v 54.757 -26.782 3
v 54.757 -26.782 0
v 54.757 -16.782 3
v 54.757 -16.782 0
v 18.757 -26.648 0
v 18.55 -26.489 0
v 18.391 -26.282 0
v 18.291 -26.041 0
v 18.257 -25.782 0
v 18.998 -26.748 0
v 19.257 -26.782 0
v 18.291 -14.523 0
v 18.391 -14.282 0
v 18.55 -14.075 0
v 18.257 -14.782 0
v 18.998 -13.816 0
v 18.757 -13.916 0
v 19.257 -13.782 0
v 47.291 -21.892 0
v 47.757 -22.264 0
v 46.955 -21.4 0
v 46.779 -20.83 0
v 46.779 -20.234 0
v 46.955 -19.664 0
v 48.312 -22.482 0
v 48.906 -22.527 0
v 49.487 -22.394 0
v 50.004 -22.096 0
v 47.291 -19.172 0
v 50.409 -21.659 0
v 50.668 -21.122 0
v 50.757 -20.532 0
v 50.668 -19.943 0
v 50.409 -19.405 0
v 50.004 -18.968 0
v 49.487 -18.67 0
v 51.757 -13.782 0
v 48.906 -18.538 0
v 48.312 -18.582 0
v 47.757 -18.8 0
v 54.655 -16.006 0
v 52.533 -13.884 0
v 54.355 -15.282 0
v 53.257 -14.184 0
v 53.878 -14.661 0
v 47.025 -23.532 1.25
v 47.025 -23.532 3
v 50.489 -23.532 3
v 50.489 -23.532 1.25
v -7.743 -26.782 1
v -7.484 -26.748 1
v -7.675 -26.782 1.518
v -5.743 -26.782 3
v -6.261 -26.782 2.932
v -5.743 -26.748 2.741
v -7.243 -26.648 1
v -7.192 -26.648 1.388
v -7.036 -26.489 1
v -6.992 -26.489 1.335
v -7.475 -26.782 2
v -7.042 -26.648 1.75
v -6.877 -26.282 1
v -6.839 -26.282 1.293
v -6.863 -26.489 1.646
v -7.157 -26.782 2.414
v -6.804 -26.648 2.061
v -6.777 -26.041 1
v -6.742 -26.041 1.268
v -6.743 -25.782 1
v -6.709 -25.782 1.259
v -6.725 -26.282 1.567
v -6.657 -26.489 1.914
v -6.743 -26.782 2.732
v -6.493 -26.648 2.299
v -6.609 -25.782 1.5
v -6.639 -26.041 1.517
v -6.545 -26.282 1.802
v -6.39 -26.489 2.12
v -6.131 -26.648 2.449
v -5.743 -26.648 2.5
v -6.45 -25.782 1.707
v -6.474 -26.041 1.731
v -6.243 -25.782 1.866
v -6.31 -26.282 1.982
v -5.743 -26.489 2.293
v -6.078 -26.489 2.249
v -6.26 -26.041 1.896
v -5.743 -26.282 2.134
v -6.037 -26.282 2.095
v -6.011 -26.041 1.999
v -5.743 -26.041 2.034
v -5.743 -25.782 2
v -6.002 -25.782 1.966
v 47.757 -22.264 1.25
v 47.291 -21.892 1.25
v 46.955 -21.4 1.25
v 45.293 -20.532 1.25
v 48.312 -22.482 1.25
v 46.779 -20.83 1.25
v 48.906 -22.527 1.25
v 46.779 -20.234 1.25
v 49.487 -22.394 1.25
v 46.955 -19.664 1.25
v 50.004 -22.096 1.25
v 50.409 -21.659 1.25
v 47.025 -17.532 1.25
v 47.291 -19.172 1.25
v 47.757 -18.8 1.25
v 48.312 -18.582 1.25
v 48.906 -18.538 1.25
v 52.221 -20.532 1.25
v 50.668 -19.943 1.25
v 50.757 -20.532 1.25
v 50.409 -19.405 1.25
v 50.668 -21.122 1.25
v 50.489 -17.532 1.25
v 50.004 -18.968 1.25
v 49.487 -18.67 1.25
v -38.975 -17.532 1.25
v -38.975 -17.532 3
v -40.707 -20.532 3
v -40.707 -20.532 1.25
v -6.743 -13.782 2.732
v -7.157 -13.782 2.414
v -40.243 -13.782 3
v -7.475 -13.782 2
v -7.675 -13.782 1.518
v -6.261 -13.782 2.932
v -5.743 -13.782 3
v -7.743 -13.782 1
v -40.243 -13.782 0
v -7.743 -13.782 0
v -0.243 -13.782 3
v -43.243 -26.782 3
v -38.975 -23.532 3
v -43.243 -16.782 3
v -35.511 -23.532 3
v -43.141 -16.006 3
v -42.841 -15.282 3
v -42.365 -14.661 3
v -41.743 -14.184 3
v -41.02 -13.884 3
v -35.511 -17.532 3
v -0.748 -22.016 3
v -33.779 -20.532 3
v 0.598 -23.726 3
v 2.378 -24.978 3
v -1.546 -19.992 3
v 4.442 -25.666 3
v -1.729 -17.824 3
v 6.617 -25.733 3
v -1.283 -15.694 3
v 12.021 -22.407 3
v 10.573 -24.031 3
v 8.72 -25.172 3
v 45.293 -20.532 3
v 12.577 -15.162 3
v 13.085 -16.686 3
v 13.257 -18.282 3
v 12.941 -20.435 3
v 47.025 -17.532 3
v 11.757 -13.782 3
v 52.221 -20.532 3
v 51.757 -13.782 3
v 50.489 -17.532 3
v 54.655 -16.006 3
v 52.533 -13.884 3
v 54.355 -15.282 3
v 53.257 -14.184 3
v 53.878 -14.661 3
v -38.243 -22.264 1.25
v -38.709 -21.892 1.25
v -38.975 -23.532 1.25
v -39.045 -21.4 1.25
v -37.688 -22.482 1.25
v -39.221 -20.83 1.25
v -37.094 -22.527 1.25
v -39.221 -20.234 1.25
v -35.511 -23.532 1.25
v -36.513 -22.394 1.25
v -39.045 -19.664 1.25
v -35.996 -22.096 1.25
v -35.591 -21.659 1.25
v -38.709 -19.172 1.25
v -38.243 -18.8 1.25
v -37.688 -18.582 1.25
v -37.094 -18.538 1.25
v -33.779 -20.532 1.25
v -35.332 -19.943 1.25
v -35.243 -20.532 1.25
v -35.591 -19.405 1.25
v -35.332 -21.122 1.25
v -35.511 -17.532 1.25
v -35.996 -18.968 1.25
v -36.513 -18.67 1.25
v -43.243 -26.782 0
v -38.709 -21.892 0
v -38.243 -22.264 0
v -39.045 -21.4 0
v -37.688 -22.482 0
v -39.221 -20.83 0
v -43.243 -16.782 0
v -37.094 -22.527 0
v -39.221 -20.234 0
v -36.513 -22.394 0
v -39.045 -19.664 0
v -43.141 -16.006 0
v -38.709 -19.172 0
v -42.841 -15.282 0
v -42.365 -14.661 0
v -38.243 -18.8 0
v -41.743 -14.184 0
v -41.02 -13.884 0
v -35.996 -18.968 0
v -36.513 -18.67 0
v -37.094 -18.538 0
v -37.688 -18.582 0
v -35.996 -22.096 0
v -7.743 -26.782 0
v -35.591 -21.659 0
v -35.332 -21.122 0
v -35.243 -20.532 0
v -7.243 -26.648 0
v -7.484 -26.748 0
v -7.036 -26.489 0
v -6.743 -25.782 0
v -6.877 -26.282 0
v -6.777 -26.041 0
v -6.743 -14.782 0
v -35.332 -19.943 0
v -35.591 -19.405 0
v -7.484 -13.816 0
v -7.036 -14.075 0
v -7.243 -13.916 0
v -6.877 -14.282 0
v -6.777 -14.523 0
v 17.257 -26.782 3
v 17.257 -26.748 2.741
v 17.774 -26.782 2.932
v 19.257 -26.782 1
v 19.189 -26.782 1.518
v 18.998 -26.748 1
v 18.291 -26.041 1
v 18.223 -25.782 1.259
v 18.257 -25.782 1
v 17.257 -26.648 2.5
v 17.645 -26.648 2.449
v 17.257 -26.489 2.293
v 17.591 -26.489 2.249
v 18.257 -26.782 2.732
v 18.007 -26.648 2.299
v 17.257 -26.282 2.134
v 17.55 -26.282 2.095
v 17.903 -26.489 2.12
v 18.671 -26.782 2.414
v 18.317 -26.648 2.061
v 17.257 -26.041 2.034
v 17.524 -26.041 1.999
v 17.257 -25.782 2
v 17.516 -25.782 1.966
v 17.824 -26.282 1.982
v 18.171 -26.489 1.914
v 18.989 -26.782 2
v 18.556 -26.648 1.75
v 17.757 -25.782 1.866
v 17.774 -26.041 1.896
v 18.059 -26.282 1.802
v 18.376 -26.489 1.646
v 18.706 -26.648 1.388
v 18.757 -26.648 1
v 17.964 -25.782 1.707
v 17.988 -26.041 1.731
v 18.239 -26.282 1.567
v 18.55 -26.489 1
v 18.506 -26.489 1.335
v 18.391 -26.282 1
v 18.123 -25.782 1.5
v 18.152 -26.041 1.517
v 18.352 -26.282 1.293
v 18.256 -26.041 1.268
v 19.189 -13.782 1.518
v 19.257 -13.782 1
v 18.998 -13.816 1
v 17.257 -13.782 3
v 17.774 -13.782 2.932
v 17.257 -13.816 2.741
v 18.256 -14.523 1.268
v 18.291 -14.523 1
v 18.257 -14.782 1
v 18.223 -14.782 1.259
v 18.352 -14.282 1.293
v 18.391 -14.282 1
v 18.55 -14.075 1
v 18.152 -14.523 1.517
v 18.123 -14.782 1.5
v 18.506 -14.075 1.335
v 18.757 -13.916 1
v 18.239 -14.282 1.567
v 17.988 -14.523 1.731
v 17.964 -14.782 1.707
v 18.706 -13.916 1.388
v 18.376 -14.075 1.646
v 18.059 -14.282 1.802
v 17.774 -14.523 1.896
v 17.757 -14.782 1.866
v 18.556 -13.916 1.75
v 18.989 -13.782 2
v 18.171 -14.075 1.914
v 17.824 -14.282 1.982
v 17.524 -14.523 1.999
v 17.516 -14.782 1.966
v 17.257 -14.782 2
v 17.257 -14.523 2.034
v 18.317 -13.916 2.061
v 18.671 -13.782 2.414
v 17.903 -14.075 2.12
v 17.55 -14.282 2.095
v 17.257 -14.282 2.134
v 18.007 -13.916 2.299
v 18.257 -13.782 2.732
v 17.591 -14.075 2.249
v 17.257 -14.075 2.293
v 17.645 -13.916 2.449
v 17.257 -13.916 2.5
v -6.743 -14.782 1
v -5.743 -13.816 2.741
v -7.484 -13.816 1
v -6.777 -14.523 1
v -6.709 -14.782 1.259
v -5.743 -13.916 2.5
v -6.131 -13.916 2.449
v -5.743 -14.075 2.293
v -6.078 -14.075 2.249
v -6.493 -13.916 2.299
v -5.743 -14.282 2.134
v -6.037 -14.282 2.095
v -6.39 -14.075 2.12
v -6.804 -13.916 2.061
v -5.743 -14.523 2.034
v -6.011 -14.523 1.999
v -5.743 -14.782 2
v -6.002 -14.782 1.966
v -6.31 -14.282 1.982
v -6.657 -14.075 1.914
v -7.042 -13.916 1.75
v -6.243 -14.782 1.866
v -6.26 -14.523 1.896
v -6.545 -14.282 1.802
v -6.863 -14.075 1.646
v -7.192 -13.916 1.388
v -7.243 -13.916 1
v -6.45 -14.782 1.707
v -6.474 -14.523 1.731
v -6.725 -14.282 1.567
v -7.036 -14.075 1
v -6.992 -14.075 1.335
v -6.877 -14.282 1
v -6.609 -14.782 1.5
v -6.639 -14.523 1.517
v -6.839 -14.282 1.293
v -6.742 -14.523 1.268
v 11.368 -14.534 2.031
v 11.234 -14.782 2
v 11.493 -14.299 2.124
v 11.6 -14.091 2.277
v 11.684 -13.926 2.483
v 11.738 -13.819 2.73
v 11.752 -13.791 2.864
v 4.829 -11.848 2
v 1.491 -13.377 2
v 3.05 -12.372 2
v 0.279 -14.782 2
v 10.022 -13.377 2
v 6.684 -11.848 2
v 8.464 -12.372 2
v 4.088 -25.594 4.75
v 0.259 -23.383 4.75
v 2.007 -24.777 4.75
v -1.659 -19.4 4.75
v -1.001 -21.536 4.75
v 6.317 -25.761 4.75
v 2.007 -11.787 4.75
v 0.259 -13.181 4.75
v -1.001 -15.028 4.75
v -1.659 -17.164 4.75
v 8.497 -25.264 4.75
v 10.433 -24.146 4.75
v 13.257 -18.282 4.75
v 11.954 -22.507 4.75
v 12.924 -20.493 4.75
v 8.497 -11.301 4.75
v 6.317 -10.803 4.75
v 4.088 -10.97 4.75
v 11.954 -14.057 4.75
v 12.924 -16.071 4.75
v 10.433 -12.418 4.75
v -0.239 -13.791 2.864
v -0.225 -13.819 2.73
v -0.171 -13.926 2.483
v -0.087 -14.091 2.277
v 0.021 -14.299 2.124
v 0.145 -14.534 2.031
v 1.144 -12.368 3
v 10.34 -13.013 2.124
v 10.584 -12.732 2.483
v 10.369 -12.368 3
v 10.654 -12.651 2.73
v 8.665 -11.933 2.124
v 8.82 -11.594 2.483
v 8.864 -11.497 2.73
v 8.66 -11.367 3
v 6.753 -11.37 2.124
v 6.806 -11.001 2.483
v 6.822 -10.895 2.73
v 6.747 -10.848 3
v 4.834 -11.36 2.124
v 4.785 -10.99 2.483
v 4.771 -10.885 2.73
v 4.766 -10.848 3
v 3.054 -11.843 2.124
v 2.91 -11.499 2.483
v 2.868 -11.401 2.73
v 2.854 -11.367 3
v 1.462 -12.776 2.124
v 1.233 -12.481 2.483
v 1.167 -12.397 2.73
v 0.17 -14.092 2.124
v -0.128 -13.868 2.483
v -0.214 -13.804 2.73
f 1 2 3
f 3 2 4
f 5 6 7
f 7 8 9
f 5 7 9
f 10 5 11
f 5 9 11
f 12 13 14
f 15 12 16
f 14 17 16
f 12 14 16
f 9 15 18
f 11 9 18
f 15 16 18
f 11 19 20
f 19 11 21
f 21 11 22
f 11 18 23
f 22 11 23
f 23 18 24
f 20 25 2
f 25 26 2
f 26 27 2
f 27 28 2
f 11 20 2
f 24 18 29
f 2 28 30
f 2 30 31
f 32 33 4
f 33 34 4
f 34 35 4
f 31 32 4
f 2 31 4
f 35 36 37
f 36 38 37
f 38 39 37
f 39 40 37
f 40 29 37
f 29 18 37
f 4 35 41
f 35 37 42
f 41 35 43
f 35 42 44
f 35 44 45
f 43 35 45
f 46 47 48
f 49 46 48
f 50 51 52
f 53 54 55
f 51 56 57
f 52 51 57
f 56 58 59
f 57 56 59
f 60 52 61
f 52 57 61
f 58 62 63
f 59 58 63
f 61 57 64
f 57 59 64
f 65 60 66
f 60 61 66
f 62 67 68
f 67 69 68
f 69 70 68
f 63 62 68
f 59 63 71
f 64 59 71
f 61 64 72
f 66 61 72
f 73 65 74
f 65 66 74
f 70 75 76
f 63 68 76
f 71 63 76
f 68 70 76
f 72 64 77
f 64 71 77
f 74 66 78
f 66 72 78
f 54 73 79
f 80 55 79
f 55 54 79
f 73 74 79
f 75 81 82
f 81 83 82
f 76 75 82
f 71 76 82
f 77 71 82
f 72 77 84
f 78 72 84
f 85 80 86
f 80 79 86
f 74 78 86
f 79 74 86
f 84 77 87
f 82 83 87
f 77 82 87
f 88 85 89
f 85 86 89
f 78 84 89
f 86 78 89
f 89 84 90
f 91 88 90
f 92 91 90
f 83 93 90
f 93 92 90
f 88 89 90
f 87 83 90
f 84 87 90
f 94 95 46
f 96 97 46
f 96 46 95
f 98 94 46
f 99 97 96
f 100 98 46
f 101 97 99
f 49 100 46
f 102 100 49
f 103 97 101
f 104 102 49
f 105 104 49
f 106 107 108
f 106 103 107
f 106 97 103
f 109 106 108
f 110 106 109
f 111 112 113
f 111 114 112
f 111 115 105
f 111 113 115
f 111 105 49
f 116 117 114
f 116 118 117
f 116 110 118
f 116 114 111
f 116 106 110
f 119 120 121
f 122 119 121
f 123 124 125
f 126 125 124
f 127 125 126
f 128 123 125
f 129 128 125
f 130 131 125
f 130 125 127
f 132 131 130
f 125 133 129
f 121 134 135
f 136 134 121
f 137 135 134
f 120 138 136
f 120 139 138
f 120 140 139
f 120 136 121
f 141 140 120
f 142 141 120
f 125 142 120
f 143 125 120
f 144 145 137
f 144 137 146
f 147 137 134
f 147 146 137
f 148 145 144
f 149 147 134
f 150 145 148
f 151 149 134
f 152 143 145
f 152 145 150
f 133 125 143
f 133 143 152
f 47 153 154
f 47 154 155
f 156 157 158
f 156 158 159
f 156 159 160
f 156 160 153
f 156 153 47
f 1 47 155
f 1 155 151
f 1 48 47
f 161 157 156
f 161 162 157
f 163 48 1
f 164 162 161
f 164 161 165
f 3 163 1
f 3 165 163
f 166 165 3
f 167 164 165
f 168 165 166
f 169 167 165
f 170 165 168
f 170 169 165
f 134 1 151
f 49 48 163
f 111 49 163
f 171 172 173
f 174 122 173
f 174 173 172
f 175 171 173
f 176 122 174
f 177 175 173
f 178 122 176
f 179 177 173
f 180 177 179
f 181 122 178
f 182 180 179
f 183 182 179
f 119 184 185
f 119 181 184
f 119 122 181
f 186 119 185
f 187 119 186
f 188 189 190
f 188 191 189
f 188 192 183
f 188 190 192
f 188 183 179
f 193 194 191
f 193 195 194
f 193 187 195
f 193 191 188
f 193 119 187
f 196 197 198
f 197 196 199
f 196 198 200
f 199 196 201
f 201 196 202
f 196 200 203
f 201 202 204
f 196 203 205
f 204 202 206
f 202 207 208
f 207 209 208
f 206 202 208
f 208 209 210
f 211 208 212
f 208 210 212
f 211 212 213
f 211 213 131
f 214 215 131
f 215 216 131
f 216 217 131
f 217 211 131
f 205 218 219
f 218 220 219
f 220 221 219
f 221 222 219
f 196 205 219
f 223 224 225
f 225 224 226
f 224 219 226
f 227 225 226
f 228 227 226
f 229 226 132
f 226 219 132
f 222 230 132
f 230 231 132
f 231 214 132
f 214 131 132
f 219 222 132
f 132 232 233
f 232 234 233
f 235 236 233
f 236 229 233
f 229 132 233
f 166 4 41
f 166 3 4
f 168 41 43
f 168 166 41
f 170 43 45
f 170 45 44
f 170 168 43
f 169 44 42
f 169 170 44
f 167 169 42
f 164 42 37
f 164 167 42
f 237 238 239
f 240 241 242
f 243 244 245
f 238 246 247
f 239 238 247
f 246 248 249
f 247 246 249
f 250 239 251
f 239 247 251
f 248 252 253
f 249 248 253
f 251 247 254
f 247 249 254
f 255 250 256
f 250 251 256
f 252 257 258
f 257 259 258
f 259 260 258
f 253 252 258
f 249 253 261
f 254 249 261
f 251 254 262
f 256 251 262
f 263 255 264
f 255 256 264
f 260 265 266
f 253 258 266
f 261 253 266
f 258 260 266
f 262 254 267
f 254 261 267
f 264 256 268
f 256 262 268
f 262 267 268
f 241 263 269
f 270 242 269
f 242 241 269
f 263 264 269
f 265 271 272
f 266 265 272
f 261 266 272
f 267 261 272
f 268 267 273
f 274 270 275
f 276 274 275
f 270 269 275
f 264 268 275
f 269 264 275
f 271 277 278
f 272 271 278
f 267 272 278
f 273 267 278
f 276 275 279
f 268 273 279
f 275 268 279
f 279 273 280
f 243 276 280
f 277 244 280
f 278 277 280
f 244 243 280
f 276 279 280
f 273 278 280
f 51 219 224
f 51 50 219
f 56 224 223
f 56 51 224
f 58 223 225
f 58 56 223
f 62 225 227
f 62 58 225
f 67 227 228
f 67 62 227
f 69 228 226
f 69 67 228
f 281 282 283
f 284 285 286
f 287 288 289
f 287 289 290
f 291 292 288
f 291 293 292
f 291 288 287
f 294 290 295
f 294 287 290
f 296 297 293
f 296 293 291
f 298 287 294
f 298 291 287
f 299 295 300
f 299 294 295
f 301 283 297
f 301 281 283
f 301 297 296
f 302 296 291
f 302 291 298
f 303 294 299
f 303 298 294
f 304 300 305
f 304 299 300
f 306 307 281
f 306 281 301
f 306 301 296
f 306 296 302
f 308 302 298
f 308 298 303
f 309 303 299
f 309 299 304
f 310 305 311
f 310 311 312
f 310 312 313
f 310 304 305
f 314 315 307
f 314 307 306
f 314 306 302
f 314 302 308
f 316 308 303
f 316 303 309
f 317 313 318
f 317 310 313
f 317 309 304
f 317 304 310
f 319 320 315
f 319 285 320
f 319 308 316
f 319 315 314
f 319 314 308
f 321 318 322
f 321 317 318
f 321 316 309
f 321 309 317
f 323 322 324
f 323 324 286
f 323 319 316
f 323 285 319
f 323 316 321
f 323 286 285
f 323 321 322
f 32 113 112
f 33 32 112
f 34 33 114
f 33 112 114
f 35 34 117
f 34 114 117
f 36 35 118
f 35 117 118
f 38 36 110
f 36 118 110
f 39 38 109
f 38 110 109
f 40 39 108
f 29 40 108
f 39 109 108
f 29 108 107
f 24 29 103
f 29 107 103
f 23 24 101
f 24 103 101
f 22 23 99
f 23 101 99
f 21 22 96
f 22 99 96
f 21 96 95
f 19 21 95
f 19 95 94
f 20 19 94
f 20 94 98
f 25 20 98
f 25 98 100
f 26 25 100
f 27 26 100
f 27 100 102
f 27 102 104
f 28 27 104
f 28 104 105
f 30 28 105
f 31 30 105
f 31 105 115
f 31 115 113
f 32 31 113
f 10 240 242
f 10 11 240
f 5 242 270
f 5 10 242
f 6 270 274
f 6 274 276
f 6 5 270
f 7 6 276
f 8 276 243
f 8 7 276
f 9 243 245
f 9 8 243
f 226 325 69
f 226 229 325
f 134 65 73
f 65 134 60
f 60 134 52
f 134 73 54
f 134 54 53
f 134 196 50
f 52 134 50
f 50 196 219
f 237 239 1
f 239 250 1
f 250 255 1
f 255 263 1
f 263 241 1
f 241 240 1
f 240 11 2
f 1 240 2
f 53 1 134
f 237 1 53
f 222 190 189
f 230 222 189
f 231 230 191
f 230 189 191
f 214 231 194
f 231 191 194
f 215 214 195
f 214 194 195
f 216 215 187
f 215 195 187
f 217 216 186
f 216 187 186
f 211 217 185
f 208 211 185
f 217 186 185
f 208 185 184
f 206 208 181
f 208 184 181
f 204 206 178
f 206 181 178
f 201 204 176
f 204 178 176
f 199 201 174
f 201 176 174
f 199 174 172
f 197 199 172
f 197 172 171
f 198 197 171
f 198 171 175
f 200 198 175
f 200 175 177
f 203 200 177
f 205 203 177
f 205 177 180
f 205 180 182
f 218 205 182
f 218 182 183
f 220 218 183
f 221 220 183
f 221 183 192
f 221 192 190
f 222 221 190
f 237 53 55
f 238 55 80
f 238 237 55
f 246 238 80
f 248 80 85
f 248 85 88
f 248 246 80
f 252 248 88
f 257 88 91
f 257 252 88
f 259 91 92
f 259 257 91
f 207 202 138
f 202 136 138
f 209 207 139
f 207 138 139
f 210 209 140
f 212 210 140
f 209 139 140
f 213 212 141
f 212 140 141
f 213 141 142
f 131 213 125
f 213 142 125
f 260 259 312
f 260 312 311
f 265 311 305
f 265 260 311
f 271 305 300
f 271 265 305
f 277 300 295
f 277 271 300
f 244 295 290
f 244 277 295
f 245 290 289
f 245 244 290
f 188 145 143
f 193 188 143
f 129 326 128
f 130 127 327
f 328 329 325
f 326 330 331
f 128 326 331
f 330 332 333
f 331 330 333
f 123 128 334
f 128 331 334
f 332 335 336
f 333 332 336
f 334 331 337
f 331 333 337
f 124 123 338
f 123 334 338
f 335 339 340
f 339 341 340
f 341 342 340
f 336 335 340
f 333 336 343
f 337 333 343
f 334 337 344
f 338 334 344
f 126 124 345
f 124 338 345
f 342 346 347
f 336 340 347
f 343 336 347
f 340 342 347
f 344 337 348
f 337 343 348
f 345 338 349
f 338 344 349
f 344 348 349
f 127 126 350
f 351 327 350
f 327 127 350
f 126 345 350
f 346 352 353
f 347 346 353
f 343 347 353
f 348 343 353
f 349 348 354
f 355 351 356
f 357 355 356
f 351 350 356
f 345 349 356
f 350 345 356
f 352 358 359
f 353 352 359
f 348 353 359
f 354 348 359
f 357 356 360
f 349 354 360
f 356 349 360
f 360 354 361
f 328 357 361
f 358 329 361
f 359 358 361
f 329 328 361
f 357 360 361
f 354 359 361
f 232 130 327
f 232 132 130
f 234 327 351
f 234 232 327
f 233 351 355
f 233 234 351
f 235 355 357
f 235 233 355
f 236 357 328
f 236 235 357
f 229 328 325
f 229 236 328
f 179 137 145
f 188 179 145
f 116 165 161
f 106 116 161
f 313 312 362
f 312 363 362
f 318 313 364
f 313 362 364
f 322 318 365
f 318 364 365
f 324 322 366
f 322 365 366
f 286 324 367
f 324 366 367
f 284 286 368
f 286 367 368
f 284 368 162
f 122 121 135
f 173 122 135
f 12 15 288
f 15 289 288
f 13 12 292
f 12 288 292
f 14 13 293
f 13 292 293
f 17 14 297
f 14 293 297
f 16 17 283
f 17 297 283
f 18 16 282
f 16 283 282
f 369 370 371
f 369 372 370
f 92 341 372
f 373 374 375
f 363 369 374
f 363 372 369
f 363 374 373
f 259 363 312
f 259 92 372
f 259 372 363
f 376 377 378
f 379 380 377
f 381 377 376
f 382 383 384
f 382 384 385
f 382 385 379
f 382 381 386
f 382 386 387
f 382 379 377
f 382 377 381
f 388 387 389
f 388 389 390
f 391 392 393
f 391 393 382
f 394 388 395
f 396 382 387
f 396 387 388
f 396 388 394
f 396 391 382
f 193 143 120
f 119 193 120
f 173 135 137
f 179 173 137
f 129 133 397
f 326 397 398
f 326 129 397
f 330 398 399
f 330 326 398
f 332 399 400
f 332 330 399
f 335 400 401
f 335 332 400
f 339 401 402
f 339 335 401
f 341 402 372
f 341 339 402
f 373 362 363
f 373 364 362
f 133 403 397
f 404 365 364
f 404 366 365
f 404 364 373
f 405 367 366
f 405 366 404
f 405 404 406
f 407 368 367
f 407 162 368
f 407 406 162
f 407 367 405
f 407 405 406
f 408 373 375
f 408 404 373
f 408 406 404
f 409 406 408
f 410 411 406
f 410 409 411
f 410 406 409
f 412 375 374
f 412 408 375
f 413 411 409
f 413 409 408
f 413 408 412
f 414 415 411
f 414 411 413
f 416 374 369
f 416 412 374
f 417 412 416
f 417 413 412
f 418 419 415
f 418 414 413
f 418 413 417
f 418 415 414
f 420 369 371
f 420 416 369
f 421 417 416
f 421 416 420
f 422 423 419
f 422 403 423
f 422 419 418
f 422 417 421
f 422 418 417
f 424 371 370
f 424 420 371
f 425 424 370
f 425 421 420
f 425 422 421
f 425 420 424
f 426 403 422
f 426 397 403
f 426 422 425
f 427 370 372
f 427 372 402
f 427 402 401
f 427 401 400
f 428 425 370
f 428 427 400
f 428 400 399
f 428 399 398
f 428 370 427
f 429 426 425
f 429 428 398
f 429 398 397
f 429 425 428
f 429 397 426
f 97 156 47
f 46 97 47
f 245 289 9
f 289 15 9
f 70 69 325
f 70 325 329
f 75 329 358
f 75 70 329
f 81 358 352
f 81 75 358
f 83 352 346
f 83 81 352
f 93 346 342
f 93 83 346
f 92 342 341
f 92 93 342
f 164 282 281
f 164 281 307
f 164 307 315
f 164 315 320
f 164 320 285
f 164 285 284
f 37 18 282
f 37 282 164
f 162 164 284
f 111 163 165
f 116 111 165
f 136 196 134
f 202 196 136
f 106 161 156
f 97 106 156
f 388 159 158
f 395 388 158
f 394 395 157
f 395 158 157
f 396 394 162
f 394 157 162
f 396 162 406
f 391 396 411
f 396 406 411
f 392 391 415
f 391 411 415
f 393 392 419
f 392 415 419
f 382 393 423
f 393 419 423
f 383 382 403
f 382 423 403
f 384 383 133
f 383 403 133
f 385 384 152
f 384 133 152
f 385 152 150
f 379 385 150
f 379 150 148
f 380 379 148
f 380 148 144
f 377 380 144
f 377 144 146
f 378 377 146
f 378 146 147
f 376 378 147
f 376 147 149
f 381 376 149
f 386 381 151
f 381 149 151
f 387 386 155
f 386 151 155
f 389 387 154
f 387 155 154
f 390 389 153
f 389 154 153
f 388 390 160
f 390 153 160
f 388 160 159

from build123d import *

# Parameters (mm, degrees)
F0_W      = 98
F0_H      = 13
F1_DEPTH  = 3
F2_R      = 3
F3_R      = 2
F4_DEPTH  = 20
F5_R      = 7.5
F6_DEPTH  = 4.75
F8_DEPTH  = 1.75
F9_W      = 25
F9_H      = 16
F10_DEPTH = 2
F11_F1_R  = 1
F11_F2_R  = 0.9999


# Not quite as in the source:
# - a fillet or chamfer is up to 0.001 mm smaller than in the source, because OpenCascade refuses the exact size


with BuildPart() as f1:
    # F0 (on Top) → F1 (new body)
    with BuildSketch(Plane.XY):
        with Locations((5.7567551136, -20.2820947109)):
            Rectangle(F0_W, F0_H)
    extrude(amount=F1_DEPTH)

    # F2
    f2_edges = [f1.edges().sort_by_distance(p)[0] for p in [
        (-43.243245, -13.782095, 1.5),
        (54.756755, -13.782095, 1.5),
    ]]
    fillet(f2_edges, radius=F2_R)

    # F3 (on face) → F4 (cut)
    with BuildSketch(Plane.XY.offset(3)):
        with Locations((48.7567551136, -20.5320947109)):
            Circle(F3_R)
        with Locations((-37.2432448864, -20.5320947109)):
            Circle(F3_R)
    extrude(amount=-F4_DEPTH, mode=Mode.SUBTRACT)

    # F5 (on Top) → F6 (join)
    with BuildSketch(Plane.XY):
        with Locations((5.7567551136, -18.2820947109)):
            Circle(F5_R)
    extrude(amount=F6_DEPTH)

    # F7 (on face) → F8 (cut)
    with BuildSketch(Plane.XY.offset(3)):
        Polygon((-33.7791432713, -20.5320947109), (-35.5111940788, -17.5320947109), (-38.975295694, -17.5320947109), (-40.7073465015, -20.5320947109), (-38.975295694, -23.5320947109), (-35.5111940788, -23.5320947109), align=None)
        Polygon((50.4888059212, -17.5320947109), (47.024704306, -17.5320947109), (45.2926534985, -20.5320947109), (47.024704306, -23.5320947109), (50.4888059212, -23.5320947109), (52.2208567287, -20.5320947109), align=None)
    extrude(amount=-F8_DEPTH, mode=Mode.SUBTRACT)

    # F9 (on face) → F10 (cut)
    with BuildSketch(Plane(origin=(0, 0, 0), x_dir=(1, 0, 0), z_dir=(0, 0, -1))):
        with Locations((5.7567551136, 18.7820947109)):
            Rectangle(F9_W, F9_H)
    extrude(amount=-F10_DEPTH, mode=Mode.SUBTRACT)

    # F11: fillet of radius 1 on 6 edges, made by hand

    # F11_f1
    f11_f1_edges = [f1.edges().sort_by_distance(p)[0] for p in [
        (18.2567551136, -20.2820947109, 2),
        (-6.7432448864, -20.2820947109, 2),
    ]]
    fillet(f11_f1_edges, radius=F11_F1_R)

    # F11_f2 (radius 1 in the source; OpenCascade refuses exactly that, so slightly less here)
    f11_f2_edges = [f1.edges().sort_by_distance(p)[0] for p in [
        (14.5067551136, -13.7820947109, 2),
        (5.7567551136, -10.7820947109, 2),
        (-2.9932448864, -13.7820947109, 2),
        (5.7567551136, -26.7820947109, 2),
        (17.9638618948, -26.7820947109, 1.7071067812),
        (-6.4503516676, -26.7820947109, 1.7071067812),
        (-6.4503516676, -13.7820947109, 1.7071067812),
        (17.9638618948, -13.7820947109, 1.7071067812),
    ]]
    fillet(f11_f2_edges, radius=F11_F2_R)


solid = f1.part
